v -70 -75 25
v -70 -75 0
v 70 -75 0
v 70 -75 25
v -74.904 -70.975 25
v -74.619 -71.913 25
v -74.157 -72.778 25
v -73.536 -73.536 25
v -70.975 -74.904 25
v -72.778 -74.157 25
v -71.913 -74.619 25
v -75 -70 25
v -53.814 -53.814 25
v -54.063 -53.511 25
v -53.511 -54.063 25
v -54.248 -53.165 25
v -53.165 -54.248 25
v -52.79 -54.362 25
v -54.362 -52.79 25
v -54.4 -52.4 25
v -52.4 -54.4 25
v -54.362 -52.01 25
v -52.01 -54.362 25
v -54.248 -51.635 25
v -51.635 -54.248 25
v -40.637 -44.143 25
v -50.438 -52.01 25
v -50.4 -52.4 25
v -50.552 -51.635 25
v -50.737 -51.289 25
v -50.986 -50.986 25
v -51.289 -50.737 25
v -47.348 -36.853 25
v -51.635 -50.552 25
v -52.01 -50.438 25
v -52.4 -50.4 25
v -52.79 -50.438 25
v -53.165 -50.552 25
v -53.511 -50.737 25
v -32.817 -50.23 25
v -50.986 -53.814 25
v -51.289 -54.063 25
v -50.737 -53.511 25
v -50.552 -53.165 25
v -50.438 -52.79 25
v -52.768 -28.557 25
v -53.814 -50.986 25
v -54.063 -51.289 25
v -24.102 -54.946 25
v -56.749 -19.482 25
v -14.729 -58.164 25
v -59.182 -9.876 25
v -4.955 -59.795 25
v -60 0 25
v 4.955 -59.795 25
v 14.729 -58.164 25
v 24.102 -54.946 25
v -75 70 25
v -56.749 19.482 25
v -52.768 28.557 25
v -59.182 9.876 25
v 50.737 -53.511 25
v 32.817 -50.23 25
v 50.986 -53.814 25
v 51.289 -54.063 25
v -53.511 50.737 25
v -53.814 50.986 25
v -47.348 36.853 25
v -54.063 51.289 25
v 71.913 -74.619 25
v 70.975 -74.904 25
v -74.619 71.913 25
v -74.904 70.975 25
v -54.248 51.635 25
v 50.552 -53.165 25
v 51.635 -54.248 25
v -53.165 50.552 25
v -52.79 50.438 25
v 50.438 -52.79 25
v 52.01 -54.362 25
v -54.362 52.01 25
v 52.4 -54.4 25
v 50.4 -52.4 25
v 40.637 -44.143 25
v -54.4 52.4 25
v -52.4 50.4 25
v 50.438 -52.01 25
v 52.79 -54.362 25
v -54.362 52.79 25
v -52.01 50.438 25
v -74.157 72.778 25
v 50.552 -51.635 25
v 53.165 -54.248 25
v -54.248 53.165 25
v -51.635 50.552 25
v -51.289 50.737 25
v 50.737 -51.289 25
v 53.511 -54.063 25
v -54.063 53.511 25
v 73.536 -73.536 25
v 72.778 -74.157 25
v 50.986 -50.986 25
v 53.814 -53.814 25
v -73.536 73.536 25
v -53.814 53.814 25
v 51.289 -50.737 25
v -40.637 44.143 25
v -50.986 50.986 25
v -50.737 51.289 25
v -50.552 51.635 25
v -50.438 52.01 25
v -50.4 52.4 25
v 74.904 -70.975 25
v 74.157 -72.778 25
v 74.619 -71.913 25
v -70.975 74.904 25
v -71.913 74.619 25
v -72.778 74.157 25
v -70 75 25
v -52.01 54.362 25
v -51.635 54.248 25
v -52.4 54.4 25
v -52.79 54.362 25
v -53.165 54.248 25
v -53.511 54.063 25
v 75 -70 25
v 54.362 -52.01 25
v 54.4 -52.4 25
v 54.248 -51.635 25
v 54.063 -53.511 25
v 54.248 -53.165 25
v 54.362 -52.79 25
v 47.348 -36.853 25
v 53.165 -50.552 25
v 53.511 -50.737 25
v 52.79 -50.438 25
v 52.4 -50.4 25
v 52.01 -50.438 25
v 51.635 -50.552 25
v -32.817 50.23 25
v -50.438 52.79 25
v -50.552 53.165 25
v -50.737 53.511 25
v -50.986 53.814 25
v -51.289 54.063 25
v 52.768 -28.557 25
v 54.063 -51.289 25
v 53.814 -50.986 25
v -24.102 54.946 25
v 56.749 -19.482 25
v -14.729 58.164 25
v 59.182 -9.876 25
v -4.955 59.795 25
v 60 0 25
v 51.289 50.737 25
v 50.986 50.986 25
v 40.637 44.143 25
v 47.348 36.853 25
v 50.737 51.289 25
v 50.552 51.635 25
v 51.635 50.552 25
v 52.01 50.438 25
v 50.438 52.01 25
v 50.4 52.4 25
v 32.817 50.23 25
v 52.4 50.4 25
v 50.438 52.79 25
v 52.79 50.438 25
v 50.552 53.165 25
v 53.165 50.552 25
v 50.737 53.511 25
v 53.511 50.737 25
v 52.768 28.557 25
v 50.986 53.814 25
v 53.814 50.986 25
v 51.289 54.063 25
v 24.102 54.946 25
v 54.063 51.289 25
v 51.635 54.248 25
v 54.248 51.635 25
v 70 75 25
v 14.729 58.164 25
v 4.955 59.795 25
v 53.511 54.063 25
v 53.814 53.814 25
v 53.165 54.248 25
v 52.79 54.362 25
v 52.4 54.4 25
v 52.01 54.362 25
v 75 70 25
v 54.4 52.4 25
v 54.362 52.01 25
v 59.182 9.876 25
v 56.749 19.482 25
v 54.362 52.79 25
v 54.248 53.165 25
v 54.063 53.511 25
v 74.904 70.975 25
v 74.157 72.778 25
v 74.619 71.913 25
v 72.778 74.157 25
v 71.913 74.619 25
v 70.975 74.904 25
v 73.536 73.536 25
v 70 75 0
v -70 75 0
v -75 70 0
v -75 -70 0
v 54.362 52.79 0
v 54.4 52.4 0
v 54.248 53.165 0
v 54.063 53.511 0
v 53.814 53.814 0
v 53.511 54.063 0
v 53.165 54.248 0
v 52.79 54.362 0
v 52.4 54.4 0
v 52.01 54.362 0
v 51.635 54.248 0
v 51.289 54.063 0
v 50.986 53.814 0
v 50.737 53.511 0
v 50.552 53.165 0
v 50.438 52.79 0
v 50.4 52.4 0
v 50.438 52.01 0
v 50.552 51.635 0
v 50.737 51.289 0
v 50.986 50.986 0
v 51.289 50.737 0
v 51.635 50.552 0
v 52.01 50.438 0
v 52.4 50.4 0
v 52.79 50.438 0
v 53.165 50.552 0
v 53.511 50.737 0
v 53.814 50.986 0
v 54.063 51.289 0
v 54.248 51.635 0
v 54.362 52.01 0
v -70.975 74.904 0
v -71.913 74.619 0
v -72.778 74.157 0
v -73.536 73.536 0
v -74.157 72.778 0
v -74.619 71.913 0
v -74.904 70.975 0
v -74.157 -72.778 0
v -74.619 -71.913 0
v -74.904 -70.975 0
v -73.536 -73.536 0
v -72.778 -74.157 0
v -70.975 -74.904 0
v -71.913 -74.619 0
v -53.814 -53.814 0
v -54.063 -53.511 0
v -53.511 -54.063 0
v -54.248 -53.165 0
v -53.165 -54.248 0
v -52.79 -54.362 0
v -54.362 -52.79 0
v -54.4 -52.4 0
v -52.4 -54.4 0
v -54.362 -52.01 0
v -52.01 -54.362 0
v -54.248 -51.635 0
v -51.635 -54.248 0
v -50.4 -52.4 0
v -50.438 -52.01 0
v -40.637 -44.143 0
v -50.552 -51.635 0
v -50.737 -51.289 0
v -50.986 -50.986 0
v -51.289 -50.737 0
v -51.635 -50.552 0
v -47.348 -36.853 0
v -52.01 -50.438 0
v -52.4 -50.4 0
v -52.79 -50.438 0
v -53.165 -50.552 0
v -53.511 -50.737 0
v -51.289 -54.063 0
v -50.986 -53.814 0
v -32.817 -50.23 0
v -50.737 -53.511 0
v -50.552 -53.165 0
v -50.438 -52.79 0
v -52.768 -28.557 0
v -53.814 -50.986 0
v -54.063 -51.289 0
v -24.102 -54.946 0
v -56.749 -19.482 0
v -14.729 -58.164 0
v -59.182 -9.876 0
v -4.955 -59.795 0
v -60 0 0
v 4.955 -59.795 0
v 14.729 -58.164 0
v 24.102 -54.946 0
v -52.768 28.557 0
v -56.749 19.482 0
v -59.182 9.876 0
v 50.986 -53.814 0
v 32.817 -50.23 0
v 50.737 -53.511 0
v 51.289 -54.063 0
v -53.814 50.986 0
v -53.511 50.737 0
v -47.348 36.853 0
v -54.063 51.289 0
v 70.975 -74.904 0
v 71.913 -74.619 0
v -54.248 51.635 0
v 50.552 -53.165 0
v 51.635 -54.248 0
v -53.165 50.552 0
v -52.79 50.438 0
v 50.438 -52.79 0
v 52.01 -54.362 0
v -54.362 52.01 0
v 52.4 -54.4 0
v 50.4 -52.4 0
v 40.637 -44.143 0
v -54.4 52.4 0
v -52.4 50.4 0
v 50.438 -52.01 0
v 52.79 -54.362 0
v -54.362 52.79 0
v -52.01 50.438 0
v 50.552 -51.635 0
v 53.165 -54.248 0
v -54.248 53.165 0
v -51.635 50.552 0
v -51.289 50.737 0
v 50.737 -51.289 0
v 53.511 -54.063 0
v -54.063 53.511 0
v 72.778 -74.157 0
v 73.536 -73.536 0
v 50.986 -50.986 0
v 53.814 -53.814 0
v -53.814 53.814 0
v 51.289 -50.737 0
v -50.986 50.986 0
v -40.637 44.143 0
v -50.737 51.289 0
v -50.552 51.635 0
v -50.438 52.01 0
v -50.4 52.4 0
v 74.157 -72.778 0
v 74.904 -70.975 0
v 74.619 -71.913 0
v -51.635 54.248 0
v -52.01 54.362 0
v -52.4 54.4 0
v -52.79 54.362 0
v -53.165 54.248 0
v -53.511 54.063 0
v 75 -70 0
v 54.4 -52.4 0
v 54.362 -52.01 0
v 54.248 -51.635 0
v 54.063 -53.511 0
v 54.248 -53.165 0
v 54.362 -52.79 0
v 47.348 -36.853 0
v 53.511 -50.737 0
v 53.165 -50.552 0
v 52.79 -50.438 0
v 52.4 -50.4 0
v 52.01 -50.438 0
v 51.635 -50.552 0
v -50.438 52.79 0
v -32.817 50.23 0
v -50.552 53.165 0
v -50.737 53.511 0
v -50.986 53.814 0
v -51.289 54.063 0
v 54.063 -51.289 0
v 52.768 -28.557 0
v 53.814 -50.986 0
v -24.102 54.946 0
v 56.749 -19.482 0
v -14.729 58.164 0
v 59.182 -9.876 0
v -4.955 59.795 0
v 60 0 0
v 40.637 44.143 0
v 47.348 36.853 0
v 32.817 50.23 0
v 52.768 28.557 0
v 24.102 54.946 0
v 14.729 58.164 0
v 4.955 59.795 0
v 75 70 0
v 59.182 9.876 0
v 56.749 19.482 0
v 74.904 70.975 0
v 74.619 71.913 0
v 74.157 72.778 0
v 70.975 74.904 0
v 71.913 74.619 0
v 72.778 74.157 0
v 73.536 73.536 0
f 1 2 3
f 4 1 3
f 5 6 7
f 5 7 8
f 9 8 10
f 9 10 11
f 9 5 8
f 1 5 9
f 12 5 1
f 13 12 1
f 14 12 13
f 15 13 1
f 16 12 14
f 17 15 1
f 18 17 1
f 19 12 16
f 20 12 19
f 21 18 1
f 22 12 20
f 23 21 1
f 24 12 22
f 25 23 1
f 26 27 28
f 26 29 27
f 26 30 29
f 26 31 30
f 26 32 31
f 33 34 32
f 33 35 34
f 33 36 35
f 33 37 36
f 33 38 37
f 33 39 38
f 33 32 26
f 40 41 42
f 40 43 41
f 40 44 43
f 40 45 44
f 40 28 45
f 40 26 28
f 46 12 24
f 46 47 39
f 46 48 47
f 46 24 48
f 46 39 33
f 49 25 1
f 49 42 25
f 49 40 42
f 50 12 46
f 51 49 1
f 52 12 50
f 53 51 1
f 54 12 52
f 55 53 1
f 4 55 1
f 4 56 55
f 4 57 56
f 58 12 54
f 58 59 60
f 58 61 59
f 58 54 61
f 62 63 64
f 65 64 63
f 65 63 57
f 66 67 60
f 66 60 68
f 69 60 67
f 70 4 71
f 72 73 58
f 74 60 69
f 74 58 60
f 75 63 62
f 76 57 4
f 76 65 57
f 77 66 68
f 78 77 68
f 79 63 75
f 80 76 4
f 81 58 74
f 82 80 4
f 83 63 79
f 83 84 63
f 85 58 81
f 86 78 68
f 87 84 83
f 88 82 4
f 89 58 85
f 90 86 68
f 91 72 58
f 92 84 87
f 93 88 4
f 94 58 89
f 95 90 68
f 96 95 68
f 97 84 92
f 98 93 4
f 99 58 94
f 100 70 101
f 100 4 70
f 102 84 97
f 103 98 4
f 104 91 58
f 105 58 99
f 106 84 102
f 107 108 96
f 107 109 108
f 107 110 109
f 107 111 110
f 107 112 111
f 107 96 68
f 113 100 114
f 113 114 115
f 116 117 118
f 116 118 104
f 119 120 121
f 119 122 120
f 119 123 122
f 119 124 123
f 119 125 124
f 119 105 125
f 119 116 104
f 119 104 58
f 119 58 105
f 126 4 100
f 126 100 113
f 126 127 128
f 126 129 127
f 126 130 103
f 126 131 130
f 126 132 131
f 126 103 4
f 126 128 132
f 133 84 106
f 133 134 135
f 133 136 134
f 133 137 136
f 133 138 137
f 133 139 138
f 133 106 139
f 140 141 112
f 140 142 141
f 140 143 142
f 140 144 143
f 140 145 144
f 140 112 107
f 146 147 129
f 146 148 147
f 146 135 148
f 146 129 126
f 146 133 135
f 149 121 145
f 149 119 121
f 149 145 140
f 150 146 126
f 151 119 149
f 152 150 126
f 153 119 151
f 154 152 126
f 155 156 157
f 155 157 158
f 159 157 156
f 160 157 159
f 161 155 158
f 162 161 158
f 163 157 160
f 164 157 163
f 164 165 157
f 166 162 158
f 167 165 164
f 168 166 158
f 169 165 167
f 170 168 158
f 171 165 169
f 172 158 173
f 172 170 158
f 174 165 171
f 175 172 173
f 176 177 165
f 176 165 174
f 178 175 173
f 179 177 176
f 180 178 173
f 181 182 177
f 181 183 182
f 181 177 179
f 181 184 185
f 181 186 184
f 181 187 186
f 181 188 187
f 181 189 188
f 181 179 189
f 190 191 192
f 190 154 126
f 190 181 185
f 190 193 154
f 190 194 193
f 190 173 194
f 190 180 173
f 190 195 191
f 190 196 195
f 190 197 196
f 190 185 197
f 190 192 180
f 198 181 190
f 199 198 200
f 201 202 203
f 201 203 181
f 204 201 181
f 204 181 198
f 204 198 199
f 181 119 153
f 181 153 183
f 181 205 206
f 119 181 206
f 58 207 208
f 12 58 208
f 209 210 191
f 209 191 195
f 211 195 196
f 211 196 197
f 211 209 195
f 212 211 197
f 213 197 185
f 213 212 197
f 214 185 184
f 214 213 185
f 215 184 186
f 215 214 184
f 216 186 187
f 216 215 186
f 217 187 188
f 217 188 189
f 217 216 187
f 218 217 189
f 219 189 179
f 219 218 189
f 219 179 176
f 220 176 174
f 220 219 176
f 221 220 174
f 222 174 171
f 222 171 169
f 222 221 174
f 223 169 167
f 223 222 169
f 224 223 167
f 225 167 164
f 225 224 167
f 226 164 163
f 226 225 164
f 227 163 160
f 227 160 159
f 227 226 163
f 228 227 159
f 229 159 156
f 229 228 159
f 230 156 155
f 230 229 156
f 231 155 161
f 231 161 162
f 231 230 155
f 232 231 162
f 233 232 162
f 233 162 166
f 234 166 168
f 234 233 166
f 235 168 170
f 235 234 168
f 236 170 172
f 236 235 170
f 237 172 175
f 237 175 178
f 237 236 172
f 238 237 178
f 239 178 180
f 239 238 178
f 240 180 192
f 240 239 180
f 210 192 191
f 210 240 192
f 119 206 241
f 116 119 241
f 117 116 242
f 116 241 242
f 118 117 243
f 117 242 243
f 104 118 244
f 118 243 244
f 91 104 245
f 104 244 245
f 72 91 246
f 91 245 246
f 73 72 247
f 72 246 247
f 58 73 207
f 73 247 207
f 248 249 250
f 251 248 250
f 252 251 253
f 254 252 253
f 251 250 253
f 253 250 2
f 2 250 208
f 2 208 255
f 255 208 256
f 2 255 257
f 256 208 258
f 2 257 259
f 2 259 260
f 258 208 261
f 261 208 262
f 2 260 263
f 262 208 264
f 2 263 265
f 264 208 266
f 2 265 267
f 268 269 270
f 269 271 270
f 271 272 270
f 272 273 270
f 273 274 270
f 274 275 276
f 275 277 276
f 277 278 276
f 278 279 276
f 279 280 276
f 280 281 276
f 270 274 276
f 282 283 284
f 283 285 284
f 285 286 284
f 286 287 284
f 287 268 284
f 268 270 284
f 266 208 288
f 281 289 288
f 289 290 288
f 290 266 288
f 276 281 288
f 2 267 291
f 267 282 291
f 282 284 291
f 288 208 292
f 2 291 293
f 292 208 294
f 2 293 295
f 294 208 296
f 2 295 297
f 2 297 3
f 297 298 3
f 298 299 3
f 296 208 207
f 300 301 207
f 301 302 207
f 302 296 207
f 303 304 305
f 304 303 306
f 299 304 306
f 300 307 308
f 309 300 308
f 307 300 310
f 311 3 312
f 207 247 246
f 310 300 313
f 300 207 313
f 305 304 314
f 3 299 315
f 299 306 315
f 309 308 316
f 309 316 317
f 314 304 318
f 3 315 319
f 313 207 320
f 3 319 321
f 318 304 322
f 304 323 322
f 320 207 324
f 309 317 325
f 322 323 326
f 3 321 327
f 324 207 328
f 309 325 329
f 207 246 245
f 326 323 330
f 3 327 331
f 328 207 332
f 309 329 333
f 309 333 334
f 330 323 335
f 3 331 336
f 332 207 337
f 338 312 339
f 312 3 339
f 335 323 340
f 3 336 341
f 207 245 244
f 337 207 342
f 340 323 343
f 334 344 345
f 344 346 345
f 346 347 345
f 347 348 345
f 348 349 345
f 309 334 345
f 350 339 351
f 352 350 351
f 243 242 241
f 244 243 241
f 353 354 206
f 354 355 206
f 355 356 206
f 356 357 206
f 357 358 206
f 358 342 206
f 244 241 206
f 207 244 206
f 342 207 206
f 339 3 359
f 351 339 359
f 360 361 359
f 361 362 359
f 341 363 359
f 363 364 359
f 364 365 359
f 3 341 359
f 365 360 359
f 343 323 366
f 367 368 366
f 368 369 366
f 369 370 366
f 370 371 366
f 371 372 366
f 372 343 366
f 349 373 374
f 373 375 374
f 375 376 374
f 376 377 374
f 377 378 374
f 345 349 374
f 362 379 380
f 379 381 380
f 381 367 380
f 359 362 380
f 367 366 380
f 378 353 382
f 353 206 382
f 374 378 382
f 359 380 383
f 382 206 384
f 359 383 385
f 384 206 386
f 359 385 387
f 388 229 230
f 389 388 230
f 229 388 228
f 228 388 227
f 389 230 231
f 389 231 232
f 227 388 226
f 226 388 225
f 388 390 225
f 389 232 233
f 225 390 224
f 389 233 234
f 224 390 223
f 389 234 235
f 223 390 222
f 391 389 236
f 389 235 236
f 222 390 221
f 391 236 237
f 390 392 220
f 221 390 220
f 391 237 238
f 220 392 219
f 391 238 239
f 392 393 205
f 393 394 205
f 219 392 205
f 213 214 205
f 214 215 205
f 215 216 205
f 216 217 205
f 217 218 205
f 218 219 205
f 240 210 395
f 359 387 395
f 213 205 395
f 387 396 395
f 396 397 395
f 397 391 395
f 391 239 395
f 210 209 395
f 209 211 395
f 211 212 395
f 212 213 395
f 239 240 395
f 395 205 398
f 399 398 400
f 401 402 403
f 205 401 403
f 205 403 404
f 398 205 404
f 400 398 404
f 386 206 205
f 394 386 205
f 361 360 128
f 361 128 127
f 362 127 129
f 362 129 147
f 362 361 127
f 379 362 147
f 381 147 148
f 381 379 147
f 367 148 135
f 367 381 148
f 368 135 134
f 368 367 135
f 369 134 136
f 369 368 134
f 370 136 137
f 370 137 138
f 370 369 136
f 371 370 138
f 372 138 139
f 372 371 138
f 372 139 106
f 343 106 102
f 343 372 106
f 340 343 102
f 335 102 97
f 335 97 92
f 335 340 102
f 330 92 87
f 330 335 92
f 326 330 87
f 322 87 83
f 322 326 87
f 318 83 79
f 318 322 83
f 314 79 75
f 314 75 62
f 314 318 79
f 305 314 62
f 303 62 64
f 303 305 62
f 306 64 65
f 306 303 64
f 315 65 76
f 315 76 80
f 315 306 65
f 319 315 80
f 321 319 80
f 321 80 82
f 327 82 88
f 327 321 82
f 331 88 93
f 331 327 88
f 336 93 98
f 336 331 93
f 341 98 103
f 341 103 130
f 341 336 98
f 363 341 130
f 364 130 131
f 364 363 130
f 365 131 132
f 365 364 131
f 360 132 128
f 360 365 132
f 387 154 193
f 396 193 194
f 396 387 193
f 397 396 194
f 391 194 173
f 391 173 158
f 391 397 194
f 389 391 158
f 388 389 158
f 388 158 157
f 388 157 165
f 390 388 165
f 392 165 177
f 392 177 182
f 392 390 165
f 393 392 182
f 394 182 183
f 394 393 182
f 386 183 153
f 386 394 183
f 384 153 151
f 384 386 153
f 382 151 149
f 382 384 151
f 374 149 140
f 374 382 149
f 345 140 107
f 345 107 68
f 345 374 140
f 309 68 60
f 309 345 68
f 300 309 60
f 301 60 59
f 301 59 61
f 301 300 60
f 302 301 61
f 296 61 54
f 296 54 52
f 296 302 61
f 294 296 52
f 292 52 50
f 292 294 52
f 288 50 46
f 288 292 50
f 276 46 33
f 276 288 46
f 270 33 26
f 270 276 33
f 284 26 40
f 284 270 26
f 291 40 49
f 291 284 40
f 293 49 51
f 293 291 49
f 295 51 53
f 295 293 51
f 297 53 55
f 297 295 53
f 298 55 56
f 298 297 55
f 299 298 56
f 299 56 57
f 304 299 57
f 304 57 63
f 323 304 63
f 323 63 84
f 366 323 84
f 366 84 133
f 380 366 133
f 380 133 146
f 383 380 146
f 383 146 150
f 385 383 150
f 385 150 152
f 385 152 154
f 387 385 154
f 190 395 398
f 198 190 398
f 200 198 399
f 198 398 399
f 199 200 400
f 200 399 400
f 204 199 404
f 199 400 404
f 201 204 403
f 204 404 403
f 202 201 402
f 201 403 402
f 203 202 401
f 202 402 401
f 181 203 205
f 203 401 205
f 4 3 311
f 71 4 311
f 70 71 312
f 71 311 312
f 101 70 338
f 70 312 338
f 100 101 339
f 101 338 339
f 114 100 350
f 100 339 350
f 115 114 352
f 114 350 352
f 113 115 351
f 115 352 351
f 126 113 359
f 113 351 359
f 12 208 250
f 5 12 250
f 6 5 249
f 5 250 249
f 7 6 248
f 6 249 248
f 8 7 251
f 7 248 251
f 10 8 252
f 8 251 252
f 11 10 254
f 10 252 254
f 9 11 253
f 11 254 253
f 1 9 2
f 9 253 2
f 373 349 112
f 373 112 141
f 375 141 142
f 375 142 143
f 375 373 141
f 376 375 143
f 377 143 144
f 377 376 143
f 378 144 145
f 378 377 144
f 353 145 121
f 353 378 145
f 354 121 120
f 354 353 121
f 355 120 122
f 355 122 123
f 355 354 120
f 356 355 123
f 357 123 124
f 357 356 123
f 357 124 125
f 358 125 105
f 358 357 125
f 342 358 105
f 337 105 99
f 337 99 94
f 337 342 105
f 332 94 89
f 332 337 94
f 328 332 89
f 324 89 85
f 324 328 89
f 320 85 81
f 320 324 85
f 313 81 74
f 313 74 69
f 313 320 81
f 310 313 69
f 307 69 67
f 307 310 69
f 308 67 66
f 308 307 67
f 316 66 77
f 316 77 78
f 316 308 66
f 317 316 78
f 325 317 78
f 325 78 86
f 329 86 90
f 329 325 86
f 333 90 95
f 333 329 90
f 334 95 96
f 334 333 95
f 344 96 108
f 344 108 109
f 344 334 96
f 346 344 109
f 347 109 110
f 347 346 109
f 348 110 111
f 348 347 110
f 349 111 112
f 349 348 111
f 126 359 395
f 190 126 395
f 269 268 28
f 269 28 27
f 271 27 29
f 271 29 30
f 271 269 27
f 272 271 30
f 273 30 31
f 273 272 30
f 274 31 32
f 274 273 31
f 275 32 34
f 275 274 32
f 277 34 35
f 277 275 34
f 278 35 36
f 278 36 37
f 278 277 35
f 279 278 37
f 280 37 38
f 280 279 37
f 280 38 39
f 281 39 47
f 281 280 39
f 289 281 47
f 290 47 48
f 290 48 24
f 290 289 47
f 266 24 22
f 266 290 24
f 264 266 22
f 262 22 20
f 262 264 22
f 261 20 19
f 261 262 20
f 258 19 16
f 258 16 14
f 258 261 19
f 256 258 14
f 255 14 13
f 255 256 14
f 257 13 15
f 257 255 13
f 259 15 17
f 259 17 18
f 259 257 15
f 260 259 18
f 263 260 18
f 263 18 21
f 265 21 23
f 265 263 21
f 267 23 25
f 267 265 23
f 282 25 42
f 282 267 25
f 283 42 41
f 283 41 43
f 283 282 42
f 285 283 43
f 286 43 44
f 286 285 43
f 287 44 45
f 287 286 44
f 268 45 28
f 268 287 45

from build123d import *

# Parameters (mm, degrees)
F0_R     = 2
F0_R_2   = 60
F1_DEPTH = 25


with BuildPart() as f1:
    # F0 (on Top) → F1 (new body)
    with BuildSketch(Plane.XY):
        with BuildLine():
            Line((70, 75), (-70, 75))
            ThreePointArc((-70, 75), (-73.535534, 73.535534), (-75, 70))
            Line((-75, 70), (-75, -70))
            ThreePointArc((-75, -70), (-73.535534, -73.535534), (-70, -75))
            Line((-70, -75), (70, -75))
            ThreePointArc((70, -75), (73.535534, -73.535534), (75, -70))
            Line((75, -70), (75, 70))
            ThreePointArc((75, 70), (73.535534, 73.535534), (70, 75))
        make_face()
        with Locations((-52.4, -52.4)):
            Circle(F0_R, mode=Mode.SUBTRACT)
        with Locations((52.4, -52.4)):
            Circle(F0_R, mode=Mode.SUBTRACT)
        with Locations((-52.4, 52.4)):
            Circle(F0_R, mode=Mode.SUBTRACT)
        Circle(F0_R_2, mode=Mode.SUBTRACT)
        with Locations((52.4, 52.4)):
            Circle(F0_R, mode=Mode.SUBTRACT)
    extrude(amount=F1_DEPTH)


solid = f1.part
